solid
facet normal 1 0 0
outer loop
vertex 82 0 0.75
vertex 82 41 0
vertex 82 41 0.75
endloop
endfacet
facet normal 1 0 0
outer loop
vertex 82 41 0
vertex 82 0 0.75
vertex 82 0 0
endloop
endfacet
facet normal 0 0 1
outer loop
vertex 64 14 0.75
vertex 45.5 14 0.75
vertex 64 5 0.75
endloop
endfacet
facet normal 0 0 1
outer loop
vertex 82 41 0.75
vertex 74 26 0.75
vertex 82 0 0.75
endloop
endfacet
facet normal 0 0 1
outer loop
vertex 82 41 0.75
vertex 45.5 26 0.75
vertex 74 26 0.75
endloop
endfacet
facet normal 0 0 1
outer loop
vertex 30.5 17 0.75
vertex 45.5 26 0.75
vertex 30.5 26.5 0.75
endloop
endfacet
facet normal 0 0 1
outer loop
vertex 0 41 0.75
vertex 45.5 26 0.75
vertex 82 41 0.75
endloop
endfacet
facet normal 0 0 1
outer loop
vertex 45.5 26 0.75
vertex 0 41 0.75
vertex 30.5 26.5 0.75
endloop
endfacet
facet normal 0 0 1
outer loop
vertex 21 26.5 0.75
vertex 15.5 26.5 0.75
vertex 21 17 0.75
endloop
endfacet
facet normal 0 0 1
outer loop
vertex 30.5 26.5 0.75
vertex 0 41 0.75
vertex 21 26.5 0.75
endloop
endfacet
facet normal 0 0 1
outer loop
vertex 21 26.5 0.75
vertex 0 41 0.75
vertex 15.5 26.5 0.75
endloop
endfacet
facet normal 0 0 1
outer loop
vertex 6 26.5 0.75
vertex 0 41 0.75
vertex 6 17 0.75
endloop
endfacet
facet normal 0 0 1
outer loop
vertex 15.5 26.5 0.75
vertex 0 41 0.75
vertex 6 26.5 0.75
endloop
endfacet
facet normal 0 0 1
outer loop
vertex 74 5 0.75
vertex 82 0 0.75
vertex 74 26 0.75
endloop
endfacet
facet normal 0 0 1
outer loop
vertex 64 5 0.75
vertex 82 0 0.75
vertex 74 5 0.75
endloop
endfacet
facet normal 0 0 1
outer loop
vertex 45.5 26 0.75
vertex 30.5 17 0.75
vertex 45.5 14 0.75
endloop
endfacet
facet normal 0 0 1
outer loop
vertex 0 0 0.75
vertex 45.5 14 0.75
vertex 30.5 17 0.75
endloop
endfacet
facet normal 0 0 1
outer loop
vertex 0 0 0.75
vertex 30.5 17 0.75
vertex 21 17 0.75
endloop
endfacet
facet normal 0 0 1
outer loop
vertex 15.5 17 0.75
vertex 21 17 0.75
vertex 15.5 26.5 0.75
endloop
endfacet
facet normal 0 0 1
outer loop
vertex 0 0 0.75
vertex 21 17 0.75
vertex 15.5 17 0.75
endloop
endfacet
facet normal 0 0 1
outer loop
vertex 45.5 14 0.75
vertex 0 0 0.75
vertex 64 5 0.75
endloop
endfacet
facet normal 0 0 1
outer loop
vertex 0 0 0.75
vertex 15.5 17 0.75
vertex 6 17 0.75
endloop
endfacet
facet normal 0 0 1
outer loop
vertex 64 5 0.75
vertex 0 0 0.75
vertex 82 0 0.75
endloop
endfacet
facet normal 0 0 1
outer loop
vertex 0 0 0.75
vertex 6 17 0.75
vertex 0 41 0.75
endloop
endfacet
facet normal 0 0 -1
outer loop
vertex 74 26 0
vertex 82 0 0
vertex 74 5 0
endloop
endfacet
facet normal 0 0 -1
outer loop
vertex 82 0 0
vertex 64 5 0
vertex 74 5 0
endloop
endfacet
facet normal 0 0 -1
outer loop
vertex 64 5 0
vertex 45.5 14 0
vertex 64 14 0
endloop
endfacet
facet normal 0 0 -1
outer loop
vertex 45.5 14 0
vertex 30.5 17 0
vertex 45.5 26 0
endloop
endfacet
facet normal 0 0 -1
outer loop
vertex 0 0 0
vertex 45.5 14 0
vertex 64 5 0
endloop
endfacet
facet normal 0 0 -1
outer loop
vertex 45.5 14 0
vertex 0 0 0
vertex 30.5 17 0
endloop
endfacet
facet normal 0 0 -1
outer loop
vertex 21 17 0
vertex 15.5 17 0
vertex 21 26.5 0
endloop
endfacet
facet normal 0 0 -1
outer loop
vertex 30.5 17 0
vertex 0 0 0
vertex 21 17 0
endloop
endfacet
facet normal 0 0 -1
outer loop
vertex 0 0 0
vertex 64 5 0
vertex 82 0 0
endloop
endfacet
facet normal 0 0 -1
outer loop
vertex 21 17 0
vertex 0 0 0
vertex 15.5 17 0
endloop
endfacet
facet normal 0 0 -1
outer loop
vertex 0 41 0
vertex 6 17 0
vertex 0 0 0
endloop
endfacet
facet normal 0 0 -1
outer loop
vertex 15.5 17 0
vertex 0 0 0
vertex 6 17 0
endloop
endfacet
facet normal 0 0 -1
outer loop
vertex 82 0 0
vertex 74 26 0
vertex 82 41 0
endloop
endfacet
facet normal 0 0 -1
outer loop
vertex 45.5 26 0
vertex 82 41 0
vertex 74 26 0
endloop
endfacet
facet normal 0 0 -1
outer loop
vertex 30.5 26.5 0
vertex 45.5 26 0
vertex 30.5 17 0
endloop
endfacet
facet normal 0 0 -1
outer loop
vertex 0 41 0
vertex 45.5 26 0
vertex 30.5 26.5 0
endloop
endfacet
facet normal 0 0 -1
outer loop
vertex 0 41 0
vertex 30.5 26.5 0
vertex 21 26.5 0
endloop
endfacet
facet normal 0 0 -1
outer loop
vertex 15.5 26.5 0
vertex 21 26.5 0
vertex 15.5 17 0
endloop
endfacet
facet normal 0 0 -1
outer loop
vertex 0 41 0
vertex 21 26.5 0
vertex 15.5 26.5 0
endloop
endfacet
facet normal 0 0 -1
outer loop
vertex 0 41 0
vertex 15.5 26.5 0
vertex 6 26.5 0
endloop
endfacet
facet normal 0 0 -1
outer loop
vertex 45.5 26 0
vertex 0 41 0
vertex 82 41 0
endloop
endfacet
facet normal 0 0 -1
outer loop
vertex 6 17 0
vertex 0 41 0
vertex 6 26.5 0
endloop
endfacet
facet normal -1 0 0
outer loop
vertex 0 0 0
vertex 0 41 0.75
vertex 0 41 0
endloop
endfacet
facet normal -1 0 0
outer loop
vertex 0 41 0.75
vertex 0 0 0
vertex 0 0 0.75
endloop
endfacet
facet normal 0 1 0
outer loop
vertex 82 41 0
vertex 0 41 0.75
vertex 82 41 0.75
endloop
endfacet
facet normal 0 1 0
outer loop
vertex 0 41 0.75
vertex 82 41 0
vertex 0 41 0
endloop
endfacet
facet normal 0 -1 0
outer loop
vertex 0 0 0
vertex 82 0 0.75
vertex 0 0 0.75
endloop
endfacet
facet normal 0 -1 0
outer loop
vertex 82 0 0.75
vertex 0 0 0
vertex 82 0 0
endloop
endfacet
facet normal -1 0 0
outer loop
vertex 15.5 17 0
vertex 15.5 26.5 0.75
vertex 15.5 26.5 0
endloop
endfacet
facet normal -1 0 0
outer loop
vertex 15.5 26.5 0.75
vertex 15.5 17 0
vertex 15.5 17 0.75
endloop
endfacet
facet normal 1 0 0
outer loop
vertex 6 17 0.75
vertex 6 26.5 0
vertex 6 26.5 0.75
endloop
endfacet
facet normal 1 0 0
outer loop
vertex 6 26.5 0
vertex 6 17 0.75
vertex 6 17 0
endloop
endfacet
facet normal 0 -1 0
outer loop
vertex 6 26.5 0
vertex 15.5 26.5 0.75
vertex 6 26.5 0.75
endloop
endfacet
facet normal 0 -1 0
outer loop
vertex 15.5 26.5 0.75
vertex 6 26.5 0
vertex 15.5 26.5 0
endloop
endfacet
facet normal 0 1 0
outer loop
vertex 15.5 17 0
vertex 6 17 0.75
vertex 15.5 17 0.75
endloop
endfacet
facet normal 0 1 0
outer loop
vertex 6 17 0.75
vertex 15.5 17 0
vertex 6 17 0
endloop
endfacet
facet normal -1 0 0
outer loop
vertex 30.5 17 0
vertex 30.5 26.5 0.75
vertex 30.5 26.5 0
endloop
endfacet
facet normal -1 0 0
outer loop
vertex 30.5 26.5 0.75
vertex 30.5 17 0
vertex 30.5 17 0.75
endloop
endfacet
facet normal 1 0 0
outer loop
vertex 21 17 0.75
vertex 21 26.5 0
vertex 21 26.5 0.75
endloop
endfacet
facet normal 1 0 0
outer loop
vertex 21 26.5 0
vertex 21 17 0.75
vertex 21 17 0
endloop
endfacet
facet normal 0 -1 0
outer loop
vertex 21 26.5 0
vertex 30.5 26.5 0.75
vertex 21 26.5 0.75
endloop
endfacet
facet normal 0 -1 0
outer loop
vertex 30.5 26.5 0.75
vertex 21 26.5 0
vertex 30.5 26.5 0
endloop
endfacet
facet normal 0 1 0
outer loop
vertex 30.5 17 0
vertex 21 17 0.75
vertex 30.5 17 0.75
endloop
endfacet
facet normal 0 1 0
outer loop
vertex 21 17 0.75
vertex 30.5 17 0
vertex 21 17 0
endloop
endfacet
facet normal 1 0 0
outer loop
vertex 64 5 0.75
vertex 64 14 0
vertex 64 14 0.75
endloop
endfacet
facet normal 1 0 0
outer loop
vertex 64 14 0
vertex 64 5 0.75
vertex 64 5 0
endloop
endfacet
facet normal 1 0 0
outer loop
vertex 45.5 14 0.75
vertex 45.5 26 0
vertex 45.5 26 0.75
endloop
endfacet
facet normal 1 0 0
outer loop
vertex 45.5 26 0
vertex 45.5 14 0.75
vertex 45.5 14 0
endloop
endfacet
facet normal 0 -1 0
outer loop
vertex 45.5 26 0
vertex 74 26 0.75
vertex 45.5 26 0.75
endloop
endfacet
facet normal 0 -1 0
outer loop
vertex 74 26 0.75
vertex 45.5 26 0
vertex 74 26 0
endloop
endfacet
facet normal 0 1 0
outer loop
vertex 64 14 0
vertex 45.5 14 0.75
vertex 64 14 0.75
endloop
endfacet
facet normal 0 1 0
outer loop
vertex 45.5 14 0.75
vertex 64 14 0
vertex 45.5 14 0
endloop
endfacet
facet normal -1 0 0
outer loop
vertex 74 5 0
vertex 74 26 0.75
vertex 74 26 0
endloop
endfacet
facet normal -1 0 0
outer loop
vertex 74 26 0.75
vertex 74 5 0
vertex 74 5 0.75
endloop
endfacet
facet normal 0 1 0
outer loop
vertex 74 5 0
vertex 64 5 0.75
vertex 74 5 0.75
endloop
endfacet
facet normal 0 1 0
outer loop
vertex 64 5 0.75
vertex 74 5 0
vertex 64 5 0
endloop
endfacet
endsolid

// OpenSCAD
/*
    Projekt Name: Trennwaende fuer das Modellhaus 3723
    Modul:  Wand Westseite
    Projekt URL: https://github.com/Hardi-St/MobaLedLib_Docu/tree/master/3D_Daten_fuer_die_MobaLedLib/Trennwände%20für%20Häuser
    Version: 0.0.1
    Autor: Moba-Nick (mobanick@wp12085804.server-he.de)
    Lizenz: CC-BY-SA-4.0 (https://creativecommons.org/licenses/by-sa/4.0/legalcode.de)
*/
//  Alle Angaben sind immer in mm bei meinen Projekten.
//  Parameter fuer die Wand
x_all = 82;  //Breite der Wand = Breite der Grundplatte
z_all = 0.75; //Wandstaerke gibnt an, wie Dick die Wand ist. 0.75 ist dick genug um kein Licht durchzulassen, aber duenn genug um Material zu sparen.
y_erdgeschoss = 41;     //Hoehe Erdgeschoss 

difference(){
    HauptWand(2);
    Fenster(76,17,9.5,9.5);
    Fenster(61,17,9.5,9.5);
    Fenster(36.5,14,18.5,12);
    Fenster(18,5,10,21);
}



/* 
!!!!!!!!!!!!!!!!!!!!!!!!!!!!!!!!!!!!!!!!!!!!!!!!!!!!!!!!!!!!!!!!!!!    
!!!!    Ab hier kommen die Module. Bitte nur aendern wann man   !!!!
!!!!    weiss was man macht.                                    !!!!
!!!!!!!!!!!!!!!!!!!!!!!!!!!!!!!!!!!!!!!!!!!!!!!!!!!!!!!!!!!!!!!!!!!
/*  
    Das Module HauptWand erstellt die Wand des Hauses inkl. der Dachschraege aus einen Polyhydron. Dazu wurde im Bereich fuer die Parameter in den  Zeilen 10 - 14 die Werte fuer die Breite der Wand (x_all) sowie die Höhe des Erdgeschosses (y_erdgeschoss) und des oberen Stockwerks (y_dachschraege) angeben.
*/

module HauptWand(typ){
  if (typ == 1){    //mit Dachschräge
        //  PolyPunkte gibt an wo sicher welcher Punkt befindet. 
        //  Die Korrdinaten werden immer im Format [x,y,z] uebergeben.
        PolyPunkte = [
        [0,0,0],    // 0
        [0,y_erdgeschoss,0],    // 1
        [x_all/2,y_all,0],    // 2
        [x_all,y_erdgeschoss,0],    // 3
        [x_all,0,0],    // 4
        [0,0,z_all],    // 5
        [x_all,0,z_all],    // 6
        [x_all,y_erdgeschoss,z_all],    // 7
        [x_all/2,y_all,z_all],    // 8
        [0,y_erdgeschoss,z_all]];    // 9
        
        //  PolyFlaechen gibt an welche Punkte welche Flaechen beschreiben. 
        //  Die Korrdinaten werden immer im Format [x,y,z] uebergeben.
        PolyFlaechen =[
        [0,1,2,3,4],    // Unten (Boden)
        [5,0,4,6],      // Vorne (vordere Kante)
        [6,4,3,7],      // Rechts unten (Erdgeschoss)
        [7,3,2,8],      // Rechts oben  (Dachgeschoss/Dachschraege)
        [6,7,8,9,5],    // Oben (Deckel)
        [9,1,0,5],      // Links unten  (Erdgeschoss)
        [8,2,1,9]];     // Links oben   (Dachgeschoss/Dachschraege)
          
        polyhedron( PolyPunkte, PolyFlaechen );
    }else if (typ == 2){    //normale Wand ohne Dach
        cube([x_all,y_erdgeschoss,z_all],false);
    }else{
        
    }
}

/*  
    Das Module Fenster erstellt wie der Name schon sagt, die Ausschnitte fuer die Fenster.
    Dabei gibt es 4 Variablen die uebergeben werden.
    "pos_x" gibt die Startposition des linken unteren Ecke im Bezug zur Mittelachse des Hauses an.
    "pos_y" gibt die Startposition der inken untren Ecke im Bezug zur Grundplatte an.
    "size_x" gibt die Breite des Fensters an
    "size_y" gibt die Hoehe des Fensters an
    Beispiel: Der Befehl "Fenster(10,20,15,10);" erzeugt ein Fenster 10mm von der Mitte nach Rechts, auf der Hoehe von 20mm mit einer Breite von 15mm und einer Hoehe von 10mm;
*/
module Fenster(pos_x, pos_y, size_x, size_y){
    translate([x_all-pos_x, pos_y, 0]){
        cube([size_x,size_y,z_all*1.25],false);
    }
}

/*  
    Das Module Fenster_rund erstellt wie der Name schon sagt, die Ausschnitte fuer die Fenster mit rundem Ausschnitt.
    Dabei gibt es 3 Variablen die uebergeben werden.
    "pos_x" gibt die Startposition der linken unteren Ecke im Bezug zur Mittelachse des Hauses an.
    "pos_y" gibt die Startposition der inken unteren Ecke im Bezug zur Grundplatte an.
    "size_x" gibt die Breite des Fensters an
    Beispiel: Der Befehl "Fenster_rund(10,20,5);" erzeugt ein Fenster 10mm von der Mitte nach Rechts, auf der Hoehe von 20mm mit einem Durchmesser von 5mm;
*/
module Fenster_Rund(pos_x, pos_y, size_x){
    
    translate([x_all/2+pos_x+size_x/2, pos_y+size_x/2, 0]){
        cylinder(h=z_all*1.25,d=size_x,false);
    }
}
